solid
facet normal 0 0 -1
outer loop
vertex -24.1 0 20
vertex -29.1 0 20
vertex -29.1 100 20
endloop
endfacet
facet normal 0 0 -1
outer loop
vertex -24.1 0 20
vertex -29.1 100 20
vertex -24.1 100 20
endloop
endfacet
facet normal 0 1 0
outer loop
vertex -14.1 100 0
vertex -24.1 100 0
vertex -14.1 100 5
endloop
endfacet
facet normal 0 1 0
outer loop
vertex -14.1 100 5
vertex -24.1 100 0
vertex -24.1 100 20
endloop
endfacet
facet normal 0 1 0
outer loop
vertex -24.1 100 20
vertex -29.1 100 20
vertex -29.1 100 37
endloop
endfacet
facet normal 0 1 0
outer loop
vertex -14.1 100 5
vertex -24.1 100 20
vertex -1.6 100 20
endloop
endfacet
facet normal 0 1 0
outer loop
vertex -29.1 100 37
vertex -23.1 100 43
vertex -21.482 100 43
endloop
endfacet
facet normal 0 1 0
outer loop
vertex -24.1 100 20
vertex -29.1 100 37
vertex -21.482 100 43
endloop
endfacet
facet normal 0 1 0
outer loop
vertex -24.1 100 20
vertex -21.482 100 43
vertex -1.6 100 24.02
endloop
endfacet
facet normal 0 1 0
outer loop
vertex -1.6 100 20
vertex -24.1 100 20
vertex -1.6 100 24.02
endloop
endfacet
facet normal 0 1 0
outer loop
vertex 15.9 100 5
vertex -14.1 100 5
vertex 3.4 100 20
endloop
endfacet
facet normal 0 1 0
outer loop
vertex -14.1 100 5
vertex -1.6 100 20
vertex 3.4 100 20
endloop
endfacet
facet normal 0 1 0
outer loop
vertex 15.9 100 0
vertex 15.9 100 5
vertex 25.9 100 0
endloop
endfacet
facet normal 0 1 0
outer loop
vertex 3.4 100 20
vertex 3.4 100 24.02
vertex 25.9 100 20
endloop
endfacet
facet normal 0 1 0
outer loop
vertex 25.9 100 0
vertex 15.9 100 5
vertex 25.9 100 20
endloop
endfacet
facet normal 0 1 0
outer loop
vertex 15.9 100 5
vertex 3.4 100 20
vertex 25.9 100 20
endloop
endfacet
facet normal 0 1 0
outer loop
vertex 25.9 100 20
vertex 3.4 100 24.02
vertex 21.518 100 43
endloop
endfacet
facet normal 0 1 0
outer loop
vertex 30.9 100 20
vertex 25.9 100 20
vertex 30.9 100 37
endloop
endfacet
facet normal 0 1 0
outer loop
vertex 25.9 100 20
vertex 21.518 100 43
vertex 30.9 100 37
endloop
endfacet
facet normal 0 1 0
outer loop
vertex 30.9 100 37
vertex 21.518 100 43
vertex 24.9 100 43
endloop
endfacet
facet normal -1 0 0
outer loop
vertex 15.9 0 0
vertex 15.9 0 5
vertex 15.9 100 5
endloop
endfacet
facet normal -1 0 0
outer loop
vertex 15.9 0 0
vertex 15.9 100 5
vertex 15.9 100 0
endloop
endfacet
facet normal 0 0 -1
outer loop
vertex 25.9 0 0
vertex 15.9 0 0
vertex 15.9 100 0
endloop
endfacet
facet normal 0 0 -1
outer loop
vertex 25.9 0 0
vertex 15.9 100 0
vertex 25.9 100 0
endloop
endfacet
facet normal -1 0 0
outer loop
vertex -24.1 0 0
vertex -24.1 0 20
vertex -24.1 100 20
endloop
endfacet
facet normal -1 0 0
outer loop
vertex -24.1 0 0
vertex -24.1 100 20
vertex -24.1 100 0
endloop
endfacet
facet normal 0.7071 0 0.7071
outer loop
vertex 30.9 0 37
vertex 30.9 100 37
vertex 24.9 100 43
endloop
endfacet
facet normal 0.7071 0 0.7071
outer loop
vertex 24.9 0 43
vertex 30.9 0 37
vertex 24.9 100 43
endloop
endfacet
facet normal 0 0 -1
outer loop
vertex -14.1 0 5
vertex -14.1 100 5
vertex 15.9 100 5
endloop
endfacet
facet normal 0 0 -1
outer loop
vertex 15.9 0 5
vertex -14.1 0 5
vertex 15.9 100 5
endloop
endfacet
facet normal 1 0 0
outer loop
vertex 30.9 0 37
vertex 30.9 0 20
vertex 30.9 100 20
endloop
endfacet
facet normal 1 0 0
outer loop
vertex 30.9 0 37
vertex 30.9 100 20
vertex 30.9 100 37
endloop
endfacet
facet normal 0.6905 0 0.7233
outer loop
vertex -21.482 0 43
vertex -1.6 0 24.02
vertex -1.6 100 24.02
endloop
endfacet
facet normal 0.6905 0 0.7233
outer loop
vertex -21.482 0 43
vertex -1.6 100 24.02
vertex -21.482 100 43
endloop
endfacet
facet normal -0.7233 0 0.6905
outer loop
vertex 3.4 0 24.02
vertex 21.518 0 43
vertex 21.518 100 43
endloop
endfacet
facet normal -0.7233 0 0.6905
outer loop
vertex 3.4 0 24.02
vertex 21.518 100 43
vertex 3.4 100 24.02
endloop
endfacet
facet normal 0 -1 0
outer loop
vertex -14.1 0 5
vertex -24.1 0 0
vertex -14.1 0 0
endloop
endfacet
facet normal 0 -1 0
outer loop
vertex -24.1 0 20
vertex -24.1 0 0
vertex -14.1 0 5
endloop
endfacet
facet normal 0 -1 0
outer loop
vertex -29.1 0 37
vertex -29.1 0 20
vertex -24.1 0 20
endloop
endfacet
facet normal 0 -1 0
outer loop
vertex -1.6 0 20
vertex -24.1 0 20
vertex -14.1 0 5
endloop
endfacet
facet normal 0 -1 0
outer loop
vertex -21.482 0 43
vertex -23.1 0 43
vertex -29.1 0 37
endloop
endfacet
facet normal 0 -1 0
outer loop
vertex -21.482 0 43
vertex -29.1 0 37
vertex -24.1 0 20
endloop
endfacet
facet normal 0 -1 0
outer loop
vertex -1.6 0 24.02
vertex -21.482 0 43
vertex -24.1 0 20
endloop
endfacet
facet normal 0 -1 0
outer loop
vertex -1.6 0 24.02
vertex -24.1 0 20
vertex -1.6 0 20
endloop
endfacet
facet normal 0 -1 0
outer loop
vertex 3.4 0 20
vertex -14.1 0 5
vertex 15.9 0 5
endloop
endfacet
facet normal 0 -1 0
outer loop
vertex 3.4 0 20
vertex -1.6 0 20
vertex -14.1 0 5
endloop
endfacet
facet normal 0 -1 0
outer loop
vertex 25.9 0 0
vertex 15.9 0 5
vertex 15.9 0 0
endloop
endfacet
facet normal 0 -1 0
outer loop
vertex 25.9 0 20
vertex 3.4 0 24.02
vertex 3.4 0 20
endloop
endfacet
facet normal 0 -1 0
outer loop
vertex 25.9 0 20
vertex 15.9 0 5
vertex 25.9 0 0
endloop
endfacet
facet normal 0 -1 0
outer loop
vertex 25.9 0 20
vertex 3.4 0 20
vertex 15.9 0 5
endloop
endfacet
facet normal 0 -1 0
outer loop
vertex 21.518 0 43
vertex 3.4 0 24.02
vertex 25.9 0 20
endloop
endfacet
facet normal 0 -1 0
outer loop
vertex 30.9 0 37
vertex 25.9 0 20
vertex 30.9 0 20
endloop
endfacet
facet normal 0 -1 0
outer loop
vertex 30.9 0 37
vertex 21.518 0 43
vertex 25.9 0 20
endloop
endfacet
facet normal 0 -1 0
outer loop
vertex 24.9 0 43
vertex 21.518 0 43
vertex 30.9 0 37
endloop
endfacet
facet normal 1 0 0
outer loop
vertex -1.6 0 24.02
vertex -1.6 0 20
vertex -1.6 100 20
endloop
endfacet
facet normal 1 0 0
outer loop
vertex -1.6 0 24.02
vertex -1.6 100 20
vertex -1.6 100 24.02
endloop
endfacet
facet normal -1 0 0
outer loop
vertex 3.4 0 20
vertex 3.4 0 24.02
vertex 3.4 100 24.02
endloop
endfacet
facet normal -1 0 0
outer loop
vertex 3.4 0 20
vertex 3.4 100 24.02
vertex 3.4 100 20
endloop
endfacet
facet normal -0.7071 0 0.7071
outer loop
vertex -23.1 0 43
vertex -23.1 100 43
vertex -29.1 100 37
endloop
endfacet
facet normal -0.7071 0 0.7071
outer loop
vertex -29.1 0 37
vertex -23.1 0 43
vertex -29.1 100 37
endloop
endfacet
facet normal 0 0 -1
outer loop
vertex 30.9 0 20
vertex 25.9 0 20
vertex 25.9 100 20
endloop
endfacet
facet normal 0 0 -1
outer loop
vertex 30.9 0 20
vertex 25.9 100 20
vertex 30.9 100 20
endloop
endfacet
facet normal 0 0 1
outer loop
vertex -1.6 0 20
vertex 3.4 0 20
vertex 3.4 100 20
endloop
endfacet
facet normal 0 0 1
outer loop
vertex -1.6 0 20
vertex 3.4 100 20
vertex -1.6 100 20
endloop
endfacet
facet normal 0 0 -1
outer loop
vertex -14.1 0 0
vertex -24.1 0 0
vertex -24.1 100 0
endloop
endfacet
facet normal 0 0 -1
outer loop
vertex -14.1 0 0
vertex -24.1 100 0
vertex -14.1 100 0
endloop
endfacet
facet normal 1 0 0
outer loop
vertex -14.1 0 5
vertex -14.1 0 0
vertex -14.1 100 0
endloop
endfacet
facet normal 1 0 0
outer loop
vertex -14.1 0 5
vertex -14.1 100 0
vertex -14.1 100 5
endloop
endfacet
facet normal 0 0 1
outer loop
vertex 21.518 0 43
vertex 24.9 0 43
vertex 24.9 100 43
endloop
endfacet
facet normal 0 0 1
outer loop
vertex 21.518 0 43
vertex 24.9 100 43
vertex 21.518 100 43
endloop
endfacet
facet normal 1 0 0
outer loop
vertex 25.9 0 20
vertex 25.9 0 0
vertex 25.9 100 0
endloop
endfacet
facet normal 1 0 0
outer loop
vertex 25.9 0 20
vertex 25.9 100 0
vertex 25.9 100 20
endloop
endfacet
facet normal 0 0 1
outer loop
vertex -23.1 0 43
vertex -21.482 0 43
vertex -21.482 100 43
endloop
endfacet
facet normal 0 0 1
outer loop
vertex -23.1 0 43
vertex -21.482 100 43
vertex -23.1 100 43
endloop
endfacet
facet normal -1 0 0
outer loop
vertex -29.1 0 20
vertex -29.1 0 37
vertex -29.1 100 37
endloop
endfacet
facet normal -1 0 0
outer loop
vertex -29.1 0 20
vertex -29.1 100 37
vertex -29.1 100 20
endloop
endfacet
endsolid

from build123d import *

# Parameters (mm, degrees)
F1_DEPTH = 100


with BuildPart() as f1:
    # F0 (on Front) → F1 (new body)
    with BuildSketch(Plane.XZ):
        Polygon((-24.100423, 20), (-24.100423, 0), (-14.100423, 0), (-14.100423, 5), (15.899577, 5), (15.899577, 0), (25.899577, 0), (25.899577, 20), (30.899577, 20), (30.899577, 37), (24.899577, 43), (21.517872, 43), (3.399577, 24.020469), (3.399577, 20), (-1.600423, 20), (-1.600423, 24.020469), (-21.482128, 43), (-23.100423, 43), (-29.100423, 37), (-29.100423, 20), align=None)
    extrude(amount=-F1_DEPTH)


solid = f1.part
